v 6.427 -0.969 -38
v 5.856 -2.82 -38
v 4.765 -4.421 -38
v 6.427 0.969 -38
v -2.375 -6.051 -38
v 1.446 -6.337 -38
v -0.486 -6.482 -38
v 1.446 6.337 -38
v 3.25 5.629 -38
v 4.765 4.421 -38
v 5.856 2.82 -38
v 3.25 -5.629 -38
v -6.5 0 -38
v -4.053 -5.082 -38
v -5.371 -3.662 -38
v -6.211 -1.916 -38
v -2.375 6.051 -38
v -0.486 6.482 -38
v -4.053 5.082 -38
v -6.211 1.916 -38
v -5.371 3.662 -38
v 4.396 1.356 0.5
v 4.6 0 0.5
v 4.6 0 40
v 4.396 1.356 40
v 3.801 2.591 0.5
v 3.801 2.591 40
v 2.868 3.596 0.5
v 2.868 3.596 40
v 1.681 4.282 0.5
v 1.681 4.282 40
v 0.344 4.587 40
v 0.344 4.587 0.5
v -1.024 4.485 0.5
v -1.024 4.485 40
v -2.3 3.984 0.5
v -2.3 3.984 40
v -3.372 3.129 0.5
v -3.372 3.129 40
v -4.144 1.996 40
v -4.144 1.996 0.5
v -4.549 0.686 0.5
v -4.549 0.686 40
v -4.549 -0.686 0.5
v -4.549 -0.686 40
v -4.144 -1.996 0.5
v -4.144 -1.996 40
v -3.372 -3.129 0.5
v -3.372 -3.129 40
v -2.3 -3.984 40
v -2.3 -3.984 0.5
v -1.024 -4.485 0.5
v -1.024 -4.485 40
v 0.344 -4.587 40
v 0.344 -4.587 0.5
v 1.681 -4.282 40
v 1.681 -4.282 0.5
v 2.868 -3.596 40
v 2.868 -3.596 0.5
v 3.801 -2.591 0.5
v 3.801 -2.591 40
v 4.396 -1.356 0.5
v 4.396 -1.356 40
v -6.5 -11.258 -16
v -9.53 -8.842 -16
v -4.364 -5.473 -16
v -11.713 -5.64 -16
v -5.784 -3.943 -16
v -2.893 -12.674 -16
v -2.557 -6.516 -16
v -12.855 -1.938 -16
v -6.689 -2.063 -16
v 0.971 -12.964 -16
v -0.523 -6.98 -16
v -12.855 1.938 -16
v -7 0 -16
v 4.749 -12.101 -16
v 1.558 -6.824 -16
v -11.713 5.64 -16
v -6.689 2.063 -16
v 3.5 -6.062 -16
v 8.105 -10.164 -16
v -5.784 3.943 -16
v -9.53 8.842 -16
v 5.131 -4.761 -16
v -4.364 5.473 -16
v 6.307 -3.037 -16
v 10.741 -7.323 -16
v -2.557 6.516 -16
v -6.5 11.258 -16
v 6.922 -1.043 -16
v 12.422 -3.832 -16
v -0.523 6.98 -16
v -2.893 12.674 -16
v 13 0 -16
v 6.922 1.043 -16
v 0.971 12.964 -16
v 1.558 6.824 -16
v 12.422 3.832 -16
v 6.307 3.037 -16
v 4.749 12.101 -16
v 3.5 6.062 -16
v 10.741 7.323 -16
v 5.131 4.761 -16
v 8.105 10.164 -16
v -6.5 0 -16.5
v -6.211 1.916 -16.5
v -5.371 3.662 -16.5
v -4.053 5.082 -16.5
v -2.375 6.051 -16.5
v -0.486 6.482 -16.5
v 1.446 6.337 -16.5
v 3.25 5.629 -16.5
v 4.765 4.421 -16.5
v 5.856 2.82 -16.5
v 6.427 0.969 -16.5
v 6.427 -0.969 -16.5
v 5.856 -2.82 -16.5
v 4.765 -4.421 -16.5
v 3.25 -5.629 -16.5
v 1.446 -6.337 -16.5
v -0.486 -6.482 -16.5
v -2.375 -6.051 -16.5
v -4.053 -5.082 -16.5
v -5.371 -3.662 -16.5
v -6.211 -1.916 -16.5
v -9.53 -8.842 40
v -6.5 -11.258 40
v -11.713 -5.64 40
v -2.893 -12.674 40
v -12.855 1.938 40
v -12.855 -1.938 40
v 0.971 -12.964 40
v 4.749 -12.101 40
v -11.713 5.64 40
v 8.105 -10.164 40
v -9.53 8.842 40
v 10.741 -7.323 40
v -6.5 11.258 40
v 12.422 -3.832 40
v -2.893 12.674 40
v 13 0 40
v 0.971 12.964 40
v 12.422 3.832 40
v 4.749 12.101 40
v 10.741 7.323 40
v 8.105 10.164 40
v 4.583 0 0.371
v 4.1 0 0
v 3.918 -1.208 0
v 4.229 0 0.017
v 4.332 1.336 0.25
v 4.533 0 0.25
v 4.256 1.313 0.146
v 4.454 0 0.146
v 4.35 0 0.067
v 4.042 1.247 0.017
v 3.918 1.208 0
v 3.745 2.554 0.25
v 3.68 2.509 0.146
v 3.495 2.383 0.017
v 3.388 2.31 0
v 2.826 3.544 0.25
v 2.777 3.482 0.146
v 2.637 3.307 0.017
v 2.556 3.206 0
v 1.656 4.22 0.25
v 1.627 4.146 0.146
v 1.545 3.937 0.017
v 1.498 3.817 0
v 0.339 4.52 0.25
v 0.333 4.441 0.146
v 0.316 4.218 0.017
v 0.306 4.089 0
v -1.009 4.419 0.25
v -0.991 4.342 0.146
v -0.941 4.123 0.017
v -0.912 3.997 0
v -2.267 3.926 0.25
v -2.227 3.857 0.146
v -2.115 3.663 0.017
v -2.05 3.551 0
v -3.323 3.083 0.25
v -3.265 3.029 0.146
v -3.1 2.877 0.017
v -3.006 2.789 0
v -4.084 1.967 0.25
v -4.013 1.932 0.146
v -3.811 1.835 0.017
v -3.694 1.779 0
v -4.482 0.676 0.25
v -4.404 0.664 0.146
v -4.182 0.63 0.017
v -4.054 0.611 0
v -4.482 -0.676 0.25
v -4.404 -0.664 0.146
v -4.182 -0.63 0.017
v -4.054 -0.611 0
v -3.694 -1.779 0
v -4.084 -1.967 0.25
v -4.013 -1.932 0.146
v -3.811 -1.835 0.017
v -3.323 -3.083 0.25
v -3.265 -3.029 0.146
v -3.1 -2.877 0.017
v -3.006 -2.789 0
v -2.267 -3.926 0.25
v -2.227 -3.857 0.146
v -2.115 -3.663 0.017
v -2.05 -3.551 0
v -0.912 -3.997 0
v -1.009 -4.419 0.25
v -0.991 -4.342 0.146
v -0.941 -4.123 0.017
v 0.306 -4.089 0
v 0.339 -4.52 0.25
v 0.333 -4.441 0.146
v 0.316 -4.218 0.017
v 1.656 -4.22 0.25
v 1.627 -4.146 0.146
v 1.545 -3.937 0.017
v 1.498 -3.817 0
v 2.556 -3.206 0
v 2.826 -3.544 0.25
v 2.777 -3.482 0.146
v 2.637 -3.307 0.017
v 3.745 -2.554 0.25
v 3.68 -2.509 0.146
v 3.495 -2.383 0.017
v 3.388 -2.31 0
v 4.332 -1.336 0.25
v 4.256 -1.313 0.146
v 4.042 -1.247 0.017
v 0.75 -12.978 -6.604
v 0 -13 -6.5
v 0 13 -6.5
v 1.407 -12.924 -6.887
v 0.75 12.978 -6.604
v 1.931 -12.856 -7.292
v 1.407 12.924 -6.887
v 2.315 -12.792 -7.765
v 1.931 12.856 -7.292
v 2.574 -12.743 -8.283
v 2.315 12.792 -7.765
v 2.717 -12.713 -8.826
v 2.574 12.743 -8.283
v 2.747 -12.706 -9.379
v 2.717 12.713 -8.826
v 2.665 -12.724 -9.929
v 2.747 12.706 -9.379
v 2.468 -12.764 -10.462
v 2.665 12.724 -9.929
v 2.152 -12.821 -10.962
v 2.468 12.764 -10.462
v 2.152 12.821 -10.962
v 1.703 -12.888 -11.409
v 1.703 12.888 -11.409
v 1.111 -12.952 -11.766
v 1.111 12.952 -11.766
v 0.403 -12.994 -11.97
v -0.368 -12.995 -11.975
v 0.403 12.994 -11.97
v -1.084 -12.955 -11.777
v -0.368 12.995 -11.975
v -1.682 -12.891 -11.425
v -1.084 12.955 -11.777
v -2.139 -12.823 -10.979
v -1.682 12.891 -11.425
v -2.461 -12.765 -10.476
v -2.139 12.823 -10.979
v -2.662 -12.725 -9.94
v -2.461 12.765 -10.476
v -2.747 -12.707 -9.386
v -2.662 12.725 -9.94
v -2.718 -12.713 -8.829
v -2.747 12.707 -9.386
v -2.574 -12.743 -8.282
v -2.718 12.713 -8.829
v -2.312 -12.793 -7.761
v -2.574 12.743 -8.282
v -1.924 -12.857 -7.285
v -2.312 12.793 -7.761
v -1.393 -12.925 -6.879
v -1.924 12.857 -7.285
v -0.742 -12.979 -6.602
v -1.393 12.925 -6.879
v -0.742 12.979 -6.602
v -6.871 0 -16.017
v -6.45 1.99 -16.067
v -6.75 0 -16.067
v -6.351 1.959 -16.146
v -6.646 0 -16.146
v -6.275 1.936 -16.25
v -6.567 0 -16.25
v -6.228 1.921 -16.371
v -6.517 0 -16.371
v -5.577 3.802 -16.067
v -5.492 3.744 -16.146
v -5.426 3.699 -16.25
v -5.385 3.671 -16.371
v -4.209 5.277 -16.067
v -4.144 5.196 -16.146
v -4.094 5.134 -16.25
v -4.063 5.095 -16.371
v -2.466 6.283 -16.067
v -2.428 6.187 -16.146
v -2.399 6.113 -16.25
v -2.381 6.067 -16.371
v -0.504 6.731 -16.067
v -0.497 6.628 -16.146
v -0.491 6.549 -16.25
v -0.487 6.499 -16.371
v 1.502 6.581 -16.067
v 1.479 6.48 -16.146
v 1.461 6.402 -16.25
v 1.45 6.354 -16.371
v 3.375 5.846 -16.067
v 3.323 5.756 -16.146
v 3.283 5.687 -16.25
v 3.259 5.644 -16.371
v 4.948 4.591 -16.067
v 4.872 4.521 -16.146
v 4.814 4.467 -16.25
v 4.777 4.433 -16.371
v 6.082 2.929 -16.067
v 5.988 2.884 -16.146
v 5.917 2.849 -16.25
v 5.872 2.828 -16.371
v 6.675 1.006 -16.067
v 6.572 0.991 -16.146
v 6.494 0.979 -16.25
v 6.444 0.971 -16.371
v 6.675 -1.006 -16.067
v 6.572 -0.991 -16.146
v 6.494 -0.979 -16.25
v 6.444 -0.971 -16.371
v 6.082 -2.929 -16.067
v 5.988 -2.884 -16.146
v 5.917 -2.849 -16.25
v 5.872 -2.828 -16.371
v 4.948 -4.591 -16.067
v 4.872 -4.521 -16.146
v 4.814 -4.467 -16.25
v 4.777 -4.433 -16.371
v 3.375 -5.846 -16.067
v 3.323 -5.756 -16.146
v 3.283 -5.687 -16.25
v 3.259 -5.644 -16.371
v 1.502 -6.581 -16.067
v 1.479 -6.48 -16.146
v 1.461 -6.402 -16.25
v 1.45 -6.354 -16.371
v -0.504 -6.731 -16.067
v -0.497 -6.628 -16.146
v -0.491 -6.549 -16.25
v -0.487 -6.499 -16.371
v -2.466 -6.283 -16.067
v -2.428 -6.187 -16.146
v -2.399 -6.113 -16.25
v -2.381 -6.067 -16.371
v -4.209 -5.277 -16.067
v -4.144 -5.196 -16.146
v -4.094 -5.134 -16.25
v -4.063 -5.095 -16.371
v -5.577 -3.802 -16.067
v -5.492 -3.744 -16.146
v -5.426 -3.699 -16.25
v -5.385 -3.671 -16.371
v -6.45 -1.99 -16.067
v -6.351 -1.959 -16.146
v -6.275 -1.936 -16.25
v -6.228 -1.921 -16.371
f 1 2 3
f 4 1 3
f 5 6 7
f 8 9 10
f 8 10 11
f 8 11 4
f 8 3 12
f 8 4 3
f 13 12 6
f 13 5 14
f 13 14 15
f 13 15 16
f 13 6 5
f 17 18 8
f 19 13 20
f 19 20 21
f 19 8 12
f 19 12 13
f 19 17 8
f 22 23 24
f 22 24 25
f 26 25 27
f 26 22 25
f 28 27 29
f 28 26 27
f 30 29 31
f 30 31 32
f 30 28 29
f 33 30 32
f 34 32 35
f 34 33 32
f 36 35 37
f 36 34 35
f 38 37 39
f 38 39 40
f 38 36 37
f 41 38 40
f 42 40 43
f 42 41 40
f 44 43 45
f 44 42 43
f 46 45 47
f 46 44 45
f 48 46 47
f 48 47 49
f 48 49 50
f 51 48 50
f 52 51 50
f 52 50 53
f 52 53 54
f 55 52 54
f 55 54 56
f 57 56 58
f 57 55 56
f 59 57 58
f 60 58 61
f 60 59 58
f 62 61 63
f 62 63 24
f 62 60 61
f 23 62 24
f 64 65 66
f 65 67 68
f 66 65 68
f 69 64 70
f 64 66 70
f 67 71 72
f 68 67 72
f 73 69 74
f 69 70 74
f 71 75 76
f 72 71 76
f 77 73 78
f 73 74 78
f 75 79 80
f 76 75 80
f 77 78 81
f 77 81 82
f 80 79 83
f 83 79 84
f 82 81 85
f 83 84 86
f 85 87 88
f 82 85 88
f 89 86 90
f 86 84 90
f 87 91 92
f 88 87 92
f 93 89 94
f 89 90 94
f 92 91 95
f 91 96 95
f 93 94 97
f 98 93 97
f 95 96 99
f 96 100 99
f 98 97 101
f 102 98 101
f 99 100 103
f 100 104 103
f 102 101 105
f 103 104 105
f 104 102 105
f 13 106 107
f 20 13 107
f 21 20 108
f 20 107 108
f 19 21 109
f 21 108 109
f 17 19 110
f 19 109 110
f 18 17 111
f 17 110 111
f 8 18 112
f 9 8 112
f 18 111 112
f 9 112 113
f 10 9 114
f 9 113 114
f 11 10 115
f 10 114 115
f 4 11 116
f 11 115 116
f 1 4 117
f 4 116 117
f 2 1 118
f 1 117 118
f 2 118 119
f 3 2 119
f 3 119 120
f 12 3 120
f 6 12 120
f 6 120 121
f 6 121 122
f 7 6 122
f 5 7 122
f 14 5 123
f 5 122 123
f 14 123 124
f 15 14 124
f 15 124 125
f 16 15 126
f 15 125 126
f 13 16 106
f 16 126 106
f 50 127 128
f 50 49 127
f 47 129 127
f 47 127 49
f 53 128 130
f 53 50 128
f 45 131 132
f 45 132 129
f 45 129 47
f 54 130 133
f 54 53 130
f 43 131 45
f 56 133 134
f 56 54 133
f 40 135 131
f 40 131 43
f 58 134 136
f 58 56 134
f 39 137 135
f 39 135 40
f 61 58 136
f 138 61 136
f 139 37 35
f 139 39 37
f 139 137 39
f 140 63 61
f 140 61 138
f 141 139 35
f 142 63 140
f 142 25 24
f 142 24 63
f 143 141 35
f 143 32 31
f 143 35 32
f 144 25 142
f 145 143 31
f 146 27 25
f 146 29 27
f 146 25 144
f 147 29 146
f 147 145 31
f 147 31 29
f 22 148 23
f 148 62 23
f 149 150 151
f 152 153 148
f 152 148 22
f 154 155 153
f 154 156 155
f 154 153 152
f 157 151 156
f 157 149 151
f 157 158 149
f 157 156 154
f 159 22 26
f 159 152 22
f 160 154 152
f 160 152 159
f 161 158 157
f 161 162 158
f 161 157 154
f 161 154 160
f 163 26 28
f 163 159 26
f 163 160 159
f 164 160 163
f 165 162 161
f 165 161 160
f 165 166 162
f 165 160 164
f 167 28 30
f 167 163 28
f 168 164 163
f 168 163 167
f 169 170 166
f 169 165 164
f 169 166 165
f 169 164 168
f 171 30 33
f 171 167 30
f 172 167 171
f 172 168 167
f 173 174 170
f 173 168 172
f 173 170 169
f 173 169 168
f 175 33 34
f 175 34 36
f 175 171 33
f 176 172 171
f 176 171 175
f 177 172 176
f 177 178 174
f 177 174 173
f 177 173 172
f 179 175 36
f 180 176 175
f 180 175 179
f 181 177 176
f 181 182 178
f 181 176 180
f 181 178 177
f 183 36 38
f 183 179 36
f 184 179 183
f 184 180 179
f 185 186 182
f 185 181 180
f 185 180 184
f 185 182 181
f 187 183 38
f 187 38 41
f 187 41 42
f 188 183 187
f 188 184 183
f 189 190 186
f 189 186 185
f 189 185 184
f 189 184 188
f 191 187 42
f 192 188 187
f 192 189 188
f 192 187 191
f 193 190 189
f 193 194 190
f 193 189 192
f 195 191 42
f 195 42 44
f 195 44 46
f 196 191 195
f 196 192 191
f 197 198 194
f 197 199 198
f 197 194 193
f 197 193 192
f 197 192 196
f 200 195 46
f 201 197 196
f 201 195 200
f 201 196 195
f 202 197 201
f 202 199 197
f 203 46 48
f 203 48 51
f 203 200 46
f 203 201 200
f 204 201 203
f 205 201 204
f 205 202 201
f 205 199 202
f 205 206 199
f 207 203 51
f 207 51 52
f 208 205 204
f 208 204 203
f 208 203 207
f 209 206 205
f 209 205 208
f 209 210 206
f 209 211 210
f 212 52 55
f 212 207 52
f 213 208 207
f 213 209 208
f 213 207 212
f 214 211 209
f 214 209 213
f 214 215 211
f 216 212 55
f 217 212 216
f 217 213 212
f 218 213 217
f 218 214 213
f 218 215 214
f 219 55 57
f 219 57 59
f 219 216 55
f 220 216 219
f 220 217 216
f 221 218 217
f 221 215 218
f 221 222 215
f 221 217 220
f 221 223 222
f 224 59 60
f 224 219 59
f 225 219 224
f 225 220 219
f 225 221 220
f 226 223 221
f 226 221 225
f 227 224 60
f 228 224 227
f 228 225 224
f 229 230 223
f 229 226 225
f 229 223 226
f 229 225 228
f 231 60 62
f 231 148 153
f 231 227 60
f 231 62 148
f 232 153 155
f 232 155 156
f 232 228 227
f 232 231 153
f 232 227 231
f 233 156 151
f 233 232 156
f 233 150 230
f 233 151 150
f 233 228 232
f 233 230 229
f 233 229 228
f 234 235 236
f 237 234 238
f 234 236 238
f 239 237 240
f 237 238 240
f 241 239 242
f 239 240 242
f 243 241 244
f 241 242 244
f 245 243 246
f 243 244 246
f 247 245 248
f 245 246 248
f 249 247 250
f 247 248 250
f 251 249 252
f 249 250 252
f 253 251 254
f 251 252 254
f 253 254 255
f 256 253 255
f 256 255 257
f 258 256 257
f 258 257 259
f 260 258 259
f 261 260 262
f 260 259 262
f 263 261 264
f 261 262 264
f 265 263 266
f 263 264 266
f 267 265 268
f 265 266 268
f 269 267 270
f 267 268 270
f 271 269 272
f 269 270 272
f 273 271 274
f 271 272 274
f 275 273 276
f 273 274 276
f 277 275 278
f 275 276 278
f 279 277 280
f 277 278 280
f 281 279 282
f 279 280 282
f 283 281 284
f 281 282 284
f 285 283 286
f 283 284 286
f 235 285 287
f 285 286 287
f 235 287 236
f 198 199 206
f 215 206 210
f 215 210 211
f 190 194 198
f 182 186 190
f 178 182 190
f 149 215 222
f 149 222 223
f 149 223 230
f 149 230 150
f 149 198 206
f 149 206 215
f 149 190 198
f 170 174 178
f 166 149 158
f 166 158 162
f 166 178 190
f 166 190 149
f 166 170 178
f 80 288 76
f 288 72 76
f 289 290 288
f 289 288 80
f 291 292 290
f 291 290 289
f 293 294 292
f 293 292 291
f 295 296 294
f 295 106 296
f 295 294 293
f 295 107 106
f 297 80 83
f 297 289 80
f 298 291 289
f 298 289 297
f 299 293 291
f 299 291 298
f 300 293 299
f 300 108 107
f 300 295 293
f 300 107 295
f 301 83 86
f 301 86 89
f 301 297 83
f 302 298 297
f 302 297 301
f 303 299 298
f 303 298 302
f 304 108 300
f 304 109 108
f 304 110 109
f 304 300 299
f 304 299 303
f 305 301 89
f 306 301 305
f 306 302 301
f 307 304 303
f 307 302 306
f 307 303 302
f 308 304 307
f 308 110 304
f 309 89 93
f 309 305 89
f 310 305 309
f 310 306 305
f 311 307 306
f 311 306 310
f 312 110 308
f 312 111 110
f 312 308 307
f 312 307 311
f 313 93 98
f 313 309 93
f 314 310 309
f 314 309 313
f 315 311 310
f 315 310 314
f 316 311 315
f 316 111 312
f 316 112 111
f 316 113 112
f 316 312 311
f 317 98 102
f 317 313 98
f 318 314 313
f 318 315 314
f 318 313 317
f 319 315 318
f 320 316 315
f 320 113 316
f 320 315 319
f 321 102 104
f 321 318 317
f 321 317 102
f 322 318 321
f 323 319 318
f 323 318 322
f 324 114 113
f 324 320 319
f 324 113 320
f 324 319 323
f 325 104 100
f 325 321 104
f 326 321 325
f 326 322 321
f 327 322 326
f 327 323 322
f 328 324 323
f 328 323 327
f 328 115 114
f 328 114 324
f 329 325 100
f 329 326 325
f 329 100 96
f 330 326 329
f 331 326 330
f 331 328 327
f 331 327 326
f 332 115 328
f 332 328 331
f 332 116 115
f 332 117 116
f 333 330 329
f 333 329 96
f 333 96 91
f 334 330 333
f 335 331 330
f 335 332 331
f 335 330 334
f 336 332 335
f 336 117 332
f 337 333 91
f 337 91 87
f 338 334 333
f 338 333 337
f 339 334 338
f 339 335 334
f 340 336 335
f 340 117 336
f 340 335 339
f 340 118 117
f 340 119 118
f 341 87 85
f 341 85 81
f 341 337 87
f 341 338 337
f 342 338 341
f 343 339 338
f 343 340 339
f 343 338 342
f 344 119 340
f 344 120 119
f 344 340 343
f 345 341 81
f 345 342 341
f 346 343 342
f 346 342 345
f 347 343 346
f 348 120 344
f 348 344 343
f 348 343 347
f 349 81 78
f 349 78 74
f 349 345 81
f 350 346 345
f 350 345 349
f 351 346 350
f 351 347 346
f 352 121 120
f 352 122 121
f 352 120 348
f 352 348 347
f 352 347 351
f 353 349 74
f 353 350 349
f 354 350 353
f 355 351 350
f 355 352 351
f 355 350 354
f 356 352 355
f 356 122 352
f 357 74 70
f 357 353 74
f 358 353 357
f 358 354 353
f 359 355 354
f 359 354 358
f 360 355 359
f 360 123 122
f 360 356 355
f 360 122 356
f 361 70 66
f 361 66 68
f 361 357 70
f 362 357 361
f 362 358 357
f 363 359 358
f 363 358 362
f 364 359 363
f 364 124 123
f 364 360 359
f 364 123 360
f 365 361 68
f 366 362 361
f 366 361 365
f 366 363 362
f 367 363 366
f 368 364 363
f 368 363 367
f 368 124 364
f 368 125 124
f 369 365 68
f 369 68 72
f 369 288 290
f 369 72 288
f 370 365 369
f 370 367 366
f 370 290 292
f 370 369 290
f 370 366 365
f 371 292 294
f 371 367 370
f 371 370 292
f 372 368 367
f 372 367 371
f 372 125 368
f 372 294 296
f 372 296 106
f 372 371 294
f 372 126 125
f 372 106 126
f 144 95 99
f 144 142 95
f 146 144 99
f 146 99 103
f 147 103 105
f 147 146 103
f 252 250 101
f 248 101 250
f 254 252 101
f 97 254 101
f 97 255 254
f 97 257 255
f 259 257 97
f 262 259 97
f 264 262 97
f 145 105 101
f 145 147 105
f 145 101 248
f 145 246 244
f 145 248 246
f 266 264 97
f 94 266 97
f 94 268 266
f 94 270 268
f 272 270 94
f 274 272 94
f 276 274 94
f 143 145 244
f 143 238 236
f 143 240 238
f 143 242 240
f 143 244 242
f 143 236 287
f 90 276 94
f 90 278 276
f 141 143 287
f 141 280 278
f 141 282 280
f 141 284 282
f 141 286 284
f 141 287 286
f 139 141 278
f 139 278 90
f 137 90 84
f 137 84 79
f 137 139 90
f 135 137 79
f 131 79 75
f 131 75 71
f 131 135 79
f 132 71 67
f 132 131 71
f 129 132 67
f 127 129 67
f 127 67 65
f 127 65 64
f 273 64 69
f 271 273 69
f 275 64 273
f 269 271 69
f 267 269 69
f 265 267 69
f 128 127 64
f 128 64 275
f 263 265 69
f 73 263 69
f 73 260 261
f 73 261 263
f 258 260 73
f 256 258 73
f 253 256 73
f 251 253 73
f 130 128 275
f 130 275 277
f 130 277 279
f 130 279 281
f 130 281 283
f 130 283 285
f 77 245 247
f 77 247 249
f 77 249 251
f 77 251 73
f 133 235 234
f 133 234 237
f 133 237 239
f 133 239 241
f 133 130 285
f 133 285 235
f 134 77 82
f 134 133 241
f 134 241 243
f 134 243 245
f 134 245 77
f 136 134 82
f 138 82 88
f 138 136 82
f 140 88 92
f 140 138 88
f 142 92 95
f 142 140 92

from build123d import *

# Parameters (mm, degrees)
CROQUIS1_R                 = 13
CROQUIS1_R_2               = 4.6
SALIENTE_EXTRUIR1_DEPTH    = 40
SALIENTE_EXTRUIR2_START    = -16
CROQUIS1_2_R               = 13
SALIENTE_EXTRUIR2_DEPTH    = 16
CROQUIS2_R                 = 6.5
SALIENTE_EXTRUIR3_DEPTH    = 22
REDONDEO1_R                = 0.5
REDONDEO2_R                = 0.5
CORTAR_EXTRUIR1_DEPTH      = 45.022721406
CORTAR_EXTRUIR1_DEPTH_BACK = 45.022721406
CROQUIS3_R                 = 2.75


with BuildPart() as part:
    # Croquis1 → Saliente-Extruir1 (new body)
    with BuildSketch(Plane.XY):
        Circle(CROQUIS1_R)
        Circle(CROQUIS1_R_2, mode=Mode.SUBTRACT)
    extrude(amount=SALIENTE_EXTRUIR1_DEPTH)

    # Croquis1<2> → Saliente-Extruir2 (add)
    with BuildSketch(Plane.XY.offset(SALIENTE_EXTRUIR2_START)):
        Circle(CROQUIS1_2_R)
    extrude(amount=SALIENTE_EXTRUIR2_DEPTH)

    # Croquis2 → Saliente-Extruir3 (add)
    with BuildSketch(Plane(origin=(0, 0, -16), x_dir=(-1, 0, 0), z_dir=(0, 0, -1))):
        Circle(CROQUIS2_R)
    extrude(amount=SALIENTE_EXTRUIR3_DEPTH)

    # Redondeo1
    redondeo1_edges = [part.edges().sort_by_distance(p)[0] for p in [
        (6.5, 0, -16),
    ]]
    fillet(redondeo1_edges, radius=REDONDEO1_R)

    # Redondeo2
    redondeo2_edges = [part.edges().sort_by_distance(p)[0] for p in [
        (-4.6, 0, 0),
    ]]
    fillet(redondeo2_edges, radius=REDONDEO2_R)

    # Croquis3 → Cortar-Extruir1 (cut, two sides: drawn at the far end of the back side and taken through both)
    with BuildSketch(Plane(origin=(0, 0, 0), x_dir=(1, 0, 0), z_dir=(0, 1, 0)).offset(-CORTAR_EXTRUIR1_DEPTH_BACK)):
        with Locations((0, 9.25)):
            Circle(CROQUIS3_R)
    extrude(amount=CORTAR_EXTRUIR1_DEPTH + CORTAR_EXTRUIR1_DEPTH_BACK, mode=Mode.SUBTRACT)


solid = part.part
